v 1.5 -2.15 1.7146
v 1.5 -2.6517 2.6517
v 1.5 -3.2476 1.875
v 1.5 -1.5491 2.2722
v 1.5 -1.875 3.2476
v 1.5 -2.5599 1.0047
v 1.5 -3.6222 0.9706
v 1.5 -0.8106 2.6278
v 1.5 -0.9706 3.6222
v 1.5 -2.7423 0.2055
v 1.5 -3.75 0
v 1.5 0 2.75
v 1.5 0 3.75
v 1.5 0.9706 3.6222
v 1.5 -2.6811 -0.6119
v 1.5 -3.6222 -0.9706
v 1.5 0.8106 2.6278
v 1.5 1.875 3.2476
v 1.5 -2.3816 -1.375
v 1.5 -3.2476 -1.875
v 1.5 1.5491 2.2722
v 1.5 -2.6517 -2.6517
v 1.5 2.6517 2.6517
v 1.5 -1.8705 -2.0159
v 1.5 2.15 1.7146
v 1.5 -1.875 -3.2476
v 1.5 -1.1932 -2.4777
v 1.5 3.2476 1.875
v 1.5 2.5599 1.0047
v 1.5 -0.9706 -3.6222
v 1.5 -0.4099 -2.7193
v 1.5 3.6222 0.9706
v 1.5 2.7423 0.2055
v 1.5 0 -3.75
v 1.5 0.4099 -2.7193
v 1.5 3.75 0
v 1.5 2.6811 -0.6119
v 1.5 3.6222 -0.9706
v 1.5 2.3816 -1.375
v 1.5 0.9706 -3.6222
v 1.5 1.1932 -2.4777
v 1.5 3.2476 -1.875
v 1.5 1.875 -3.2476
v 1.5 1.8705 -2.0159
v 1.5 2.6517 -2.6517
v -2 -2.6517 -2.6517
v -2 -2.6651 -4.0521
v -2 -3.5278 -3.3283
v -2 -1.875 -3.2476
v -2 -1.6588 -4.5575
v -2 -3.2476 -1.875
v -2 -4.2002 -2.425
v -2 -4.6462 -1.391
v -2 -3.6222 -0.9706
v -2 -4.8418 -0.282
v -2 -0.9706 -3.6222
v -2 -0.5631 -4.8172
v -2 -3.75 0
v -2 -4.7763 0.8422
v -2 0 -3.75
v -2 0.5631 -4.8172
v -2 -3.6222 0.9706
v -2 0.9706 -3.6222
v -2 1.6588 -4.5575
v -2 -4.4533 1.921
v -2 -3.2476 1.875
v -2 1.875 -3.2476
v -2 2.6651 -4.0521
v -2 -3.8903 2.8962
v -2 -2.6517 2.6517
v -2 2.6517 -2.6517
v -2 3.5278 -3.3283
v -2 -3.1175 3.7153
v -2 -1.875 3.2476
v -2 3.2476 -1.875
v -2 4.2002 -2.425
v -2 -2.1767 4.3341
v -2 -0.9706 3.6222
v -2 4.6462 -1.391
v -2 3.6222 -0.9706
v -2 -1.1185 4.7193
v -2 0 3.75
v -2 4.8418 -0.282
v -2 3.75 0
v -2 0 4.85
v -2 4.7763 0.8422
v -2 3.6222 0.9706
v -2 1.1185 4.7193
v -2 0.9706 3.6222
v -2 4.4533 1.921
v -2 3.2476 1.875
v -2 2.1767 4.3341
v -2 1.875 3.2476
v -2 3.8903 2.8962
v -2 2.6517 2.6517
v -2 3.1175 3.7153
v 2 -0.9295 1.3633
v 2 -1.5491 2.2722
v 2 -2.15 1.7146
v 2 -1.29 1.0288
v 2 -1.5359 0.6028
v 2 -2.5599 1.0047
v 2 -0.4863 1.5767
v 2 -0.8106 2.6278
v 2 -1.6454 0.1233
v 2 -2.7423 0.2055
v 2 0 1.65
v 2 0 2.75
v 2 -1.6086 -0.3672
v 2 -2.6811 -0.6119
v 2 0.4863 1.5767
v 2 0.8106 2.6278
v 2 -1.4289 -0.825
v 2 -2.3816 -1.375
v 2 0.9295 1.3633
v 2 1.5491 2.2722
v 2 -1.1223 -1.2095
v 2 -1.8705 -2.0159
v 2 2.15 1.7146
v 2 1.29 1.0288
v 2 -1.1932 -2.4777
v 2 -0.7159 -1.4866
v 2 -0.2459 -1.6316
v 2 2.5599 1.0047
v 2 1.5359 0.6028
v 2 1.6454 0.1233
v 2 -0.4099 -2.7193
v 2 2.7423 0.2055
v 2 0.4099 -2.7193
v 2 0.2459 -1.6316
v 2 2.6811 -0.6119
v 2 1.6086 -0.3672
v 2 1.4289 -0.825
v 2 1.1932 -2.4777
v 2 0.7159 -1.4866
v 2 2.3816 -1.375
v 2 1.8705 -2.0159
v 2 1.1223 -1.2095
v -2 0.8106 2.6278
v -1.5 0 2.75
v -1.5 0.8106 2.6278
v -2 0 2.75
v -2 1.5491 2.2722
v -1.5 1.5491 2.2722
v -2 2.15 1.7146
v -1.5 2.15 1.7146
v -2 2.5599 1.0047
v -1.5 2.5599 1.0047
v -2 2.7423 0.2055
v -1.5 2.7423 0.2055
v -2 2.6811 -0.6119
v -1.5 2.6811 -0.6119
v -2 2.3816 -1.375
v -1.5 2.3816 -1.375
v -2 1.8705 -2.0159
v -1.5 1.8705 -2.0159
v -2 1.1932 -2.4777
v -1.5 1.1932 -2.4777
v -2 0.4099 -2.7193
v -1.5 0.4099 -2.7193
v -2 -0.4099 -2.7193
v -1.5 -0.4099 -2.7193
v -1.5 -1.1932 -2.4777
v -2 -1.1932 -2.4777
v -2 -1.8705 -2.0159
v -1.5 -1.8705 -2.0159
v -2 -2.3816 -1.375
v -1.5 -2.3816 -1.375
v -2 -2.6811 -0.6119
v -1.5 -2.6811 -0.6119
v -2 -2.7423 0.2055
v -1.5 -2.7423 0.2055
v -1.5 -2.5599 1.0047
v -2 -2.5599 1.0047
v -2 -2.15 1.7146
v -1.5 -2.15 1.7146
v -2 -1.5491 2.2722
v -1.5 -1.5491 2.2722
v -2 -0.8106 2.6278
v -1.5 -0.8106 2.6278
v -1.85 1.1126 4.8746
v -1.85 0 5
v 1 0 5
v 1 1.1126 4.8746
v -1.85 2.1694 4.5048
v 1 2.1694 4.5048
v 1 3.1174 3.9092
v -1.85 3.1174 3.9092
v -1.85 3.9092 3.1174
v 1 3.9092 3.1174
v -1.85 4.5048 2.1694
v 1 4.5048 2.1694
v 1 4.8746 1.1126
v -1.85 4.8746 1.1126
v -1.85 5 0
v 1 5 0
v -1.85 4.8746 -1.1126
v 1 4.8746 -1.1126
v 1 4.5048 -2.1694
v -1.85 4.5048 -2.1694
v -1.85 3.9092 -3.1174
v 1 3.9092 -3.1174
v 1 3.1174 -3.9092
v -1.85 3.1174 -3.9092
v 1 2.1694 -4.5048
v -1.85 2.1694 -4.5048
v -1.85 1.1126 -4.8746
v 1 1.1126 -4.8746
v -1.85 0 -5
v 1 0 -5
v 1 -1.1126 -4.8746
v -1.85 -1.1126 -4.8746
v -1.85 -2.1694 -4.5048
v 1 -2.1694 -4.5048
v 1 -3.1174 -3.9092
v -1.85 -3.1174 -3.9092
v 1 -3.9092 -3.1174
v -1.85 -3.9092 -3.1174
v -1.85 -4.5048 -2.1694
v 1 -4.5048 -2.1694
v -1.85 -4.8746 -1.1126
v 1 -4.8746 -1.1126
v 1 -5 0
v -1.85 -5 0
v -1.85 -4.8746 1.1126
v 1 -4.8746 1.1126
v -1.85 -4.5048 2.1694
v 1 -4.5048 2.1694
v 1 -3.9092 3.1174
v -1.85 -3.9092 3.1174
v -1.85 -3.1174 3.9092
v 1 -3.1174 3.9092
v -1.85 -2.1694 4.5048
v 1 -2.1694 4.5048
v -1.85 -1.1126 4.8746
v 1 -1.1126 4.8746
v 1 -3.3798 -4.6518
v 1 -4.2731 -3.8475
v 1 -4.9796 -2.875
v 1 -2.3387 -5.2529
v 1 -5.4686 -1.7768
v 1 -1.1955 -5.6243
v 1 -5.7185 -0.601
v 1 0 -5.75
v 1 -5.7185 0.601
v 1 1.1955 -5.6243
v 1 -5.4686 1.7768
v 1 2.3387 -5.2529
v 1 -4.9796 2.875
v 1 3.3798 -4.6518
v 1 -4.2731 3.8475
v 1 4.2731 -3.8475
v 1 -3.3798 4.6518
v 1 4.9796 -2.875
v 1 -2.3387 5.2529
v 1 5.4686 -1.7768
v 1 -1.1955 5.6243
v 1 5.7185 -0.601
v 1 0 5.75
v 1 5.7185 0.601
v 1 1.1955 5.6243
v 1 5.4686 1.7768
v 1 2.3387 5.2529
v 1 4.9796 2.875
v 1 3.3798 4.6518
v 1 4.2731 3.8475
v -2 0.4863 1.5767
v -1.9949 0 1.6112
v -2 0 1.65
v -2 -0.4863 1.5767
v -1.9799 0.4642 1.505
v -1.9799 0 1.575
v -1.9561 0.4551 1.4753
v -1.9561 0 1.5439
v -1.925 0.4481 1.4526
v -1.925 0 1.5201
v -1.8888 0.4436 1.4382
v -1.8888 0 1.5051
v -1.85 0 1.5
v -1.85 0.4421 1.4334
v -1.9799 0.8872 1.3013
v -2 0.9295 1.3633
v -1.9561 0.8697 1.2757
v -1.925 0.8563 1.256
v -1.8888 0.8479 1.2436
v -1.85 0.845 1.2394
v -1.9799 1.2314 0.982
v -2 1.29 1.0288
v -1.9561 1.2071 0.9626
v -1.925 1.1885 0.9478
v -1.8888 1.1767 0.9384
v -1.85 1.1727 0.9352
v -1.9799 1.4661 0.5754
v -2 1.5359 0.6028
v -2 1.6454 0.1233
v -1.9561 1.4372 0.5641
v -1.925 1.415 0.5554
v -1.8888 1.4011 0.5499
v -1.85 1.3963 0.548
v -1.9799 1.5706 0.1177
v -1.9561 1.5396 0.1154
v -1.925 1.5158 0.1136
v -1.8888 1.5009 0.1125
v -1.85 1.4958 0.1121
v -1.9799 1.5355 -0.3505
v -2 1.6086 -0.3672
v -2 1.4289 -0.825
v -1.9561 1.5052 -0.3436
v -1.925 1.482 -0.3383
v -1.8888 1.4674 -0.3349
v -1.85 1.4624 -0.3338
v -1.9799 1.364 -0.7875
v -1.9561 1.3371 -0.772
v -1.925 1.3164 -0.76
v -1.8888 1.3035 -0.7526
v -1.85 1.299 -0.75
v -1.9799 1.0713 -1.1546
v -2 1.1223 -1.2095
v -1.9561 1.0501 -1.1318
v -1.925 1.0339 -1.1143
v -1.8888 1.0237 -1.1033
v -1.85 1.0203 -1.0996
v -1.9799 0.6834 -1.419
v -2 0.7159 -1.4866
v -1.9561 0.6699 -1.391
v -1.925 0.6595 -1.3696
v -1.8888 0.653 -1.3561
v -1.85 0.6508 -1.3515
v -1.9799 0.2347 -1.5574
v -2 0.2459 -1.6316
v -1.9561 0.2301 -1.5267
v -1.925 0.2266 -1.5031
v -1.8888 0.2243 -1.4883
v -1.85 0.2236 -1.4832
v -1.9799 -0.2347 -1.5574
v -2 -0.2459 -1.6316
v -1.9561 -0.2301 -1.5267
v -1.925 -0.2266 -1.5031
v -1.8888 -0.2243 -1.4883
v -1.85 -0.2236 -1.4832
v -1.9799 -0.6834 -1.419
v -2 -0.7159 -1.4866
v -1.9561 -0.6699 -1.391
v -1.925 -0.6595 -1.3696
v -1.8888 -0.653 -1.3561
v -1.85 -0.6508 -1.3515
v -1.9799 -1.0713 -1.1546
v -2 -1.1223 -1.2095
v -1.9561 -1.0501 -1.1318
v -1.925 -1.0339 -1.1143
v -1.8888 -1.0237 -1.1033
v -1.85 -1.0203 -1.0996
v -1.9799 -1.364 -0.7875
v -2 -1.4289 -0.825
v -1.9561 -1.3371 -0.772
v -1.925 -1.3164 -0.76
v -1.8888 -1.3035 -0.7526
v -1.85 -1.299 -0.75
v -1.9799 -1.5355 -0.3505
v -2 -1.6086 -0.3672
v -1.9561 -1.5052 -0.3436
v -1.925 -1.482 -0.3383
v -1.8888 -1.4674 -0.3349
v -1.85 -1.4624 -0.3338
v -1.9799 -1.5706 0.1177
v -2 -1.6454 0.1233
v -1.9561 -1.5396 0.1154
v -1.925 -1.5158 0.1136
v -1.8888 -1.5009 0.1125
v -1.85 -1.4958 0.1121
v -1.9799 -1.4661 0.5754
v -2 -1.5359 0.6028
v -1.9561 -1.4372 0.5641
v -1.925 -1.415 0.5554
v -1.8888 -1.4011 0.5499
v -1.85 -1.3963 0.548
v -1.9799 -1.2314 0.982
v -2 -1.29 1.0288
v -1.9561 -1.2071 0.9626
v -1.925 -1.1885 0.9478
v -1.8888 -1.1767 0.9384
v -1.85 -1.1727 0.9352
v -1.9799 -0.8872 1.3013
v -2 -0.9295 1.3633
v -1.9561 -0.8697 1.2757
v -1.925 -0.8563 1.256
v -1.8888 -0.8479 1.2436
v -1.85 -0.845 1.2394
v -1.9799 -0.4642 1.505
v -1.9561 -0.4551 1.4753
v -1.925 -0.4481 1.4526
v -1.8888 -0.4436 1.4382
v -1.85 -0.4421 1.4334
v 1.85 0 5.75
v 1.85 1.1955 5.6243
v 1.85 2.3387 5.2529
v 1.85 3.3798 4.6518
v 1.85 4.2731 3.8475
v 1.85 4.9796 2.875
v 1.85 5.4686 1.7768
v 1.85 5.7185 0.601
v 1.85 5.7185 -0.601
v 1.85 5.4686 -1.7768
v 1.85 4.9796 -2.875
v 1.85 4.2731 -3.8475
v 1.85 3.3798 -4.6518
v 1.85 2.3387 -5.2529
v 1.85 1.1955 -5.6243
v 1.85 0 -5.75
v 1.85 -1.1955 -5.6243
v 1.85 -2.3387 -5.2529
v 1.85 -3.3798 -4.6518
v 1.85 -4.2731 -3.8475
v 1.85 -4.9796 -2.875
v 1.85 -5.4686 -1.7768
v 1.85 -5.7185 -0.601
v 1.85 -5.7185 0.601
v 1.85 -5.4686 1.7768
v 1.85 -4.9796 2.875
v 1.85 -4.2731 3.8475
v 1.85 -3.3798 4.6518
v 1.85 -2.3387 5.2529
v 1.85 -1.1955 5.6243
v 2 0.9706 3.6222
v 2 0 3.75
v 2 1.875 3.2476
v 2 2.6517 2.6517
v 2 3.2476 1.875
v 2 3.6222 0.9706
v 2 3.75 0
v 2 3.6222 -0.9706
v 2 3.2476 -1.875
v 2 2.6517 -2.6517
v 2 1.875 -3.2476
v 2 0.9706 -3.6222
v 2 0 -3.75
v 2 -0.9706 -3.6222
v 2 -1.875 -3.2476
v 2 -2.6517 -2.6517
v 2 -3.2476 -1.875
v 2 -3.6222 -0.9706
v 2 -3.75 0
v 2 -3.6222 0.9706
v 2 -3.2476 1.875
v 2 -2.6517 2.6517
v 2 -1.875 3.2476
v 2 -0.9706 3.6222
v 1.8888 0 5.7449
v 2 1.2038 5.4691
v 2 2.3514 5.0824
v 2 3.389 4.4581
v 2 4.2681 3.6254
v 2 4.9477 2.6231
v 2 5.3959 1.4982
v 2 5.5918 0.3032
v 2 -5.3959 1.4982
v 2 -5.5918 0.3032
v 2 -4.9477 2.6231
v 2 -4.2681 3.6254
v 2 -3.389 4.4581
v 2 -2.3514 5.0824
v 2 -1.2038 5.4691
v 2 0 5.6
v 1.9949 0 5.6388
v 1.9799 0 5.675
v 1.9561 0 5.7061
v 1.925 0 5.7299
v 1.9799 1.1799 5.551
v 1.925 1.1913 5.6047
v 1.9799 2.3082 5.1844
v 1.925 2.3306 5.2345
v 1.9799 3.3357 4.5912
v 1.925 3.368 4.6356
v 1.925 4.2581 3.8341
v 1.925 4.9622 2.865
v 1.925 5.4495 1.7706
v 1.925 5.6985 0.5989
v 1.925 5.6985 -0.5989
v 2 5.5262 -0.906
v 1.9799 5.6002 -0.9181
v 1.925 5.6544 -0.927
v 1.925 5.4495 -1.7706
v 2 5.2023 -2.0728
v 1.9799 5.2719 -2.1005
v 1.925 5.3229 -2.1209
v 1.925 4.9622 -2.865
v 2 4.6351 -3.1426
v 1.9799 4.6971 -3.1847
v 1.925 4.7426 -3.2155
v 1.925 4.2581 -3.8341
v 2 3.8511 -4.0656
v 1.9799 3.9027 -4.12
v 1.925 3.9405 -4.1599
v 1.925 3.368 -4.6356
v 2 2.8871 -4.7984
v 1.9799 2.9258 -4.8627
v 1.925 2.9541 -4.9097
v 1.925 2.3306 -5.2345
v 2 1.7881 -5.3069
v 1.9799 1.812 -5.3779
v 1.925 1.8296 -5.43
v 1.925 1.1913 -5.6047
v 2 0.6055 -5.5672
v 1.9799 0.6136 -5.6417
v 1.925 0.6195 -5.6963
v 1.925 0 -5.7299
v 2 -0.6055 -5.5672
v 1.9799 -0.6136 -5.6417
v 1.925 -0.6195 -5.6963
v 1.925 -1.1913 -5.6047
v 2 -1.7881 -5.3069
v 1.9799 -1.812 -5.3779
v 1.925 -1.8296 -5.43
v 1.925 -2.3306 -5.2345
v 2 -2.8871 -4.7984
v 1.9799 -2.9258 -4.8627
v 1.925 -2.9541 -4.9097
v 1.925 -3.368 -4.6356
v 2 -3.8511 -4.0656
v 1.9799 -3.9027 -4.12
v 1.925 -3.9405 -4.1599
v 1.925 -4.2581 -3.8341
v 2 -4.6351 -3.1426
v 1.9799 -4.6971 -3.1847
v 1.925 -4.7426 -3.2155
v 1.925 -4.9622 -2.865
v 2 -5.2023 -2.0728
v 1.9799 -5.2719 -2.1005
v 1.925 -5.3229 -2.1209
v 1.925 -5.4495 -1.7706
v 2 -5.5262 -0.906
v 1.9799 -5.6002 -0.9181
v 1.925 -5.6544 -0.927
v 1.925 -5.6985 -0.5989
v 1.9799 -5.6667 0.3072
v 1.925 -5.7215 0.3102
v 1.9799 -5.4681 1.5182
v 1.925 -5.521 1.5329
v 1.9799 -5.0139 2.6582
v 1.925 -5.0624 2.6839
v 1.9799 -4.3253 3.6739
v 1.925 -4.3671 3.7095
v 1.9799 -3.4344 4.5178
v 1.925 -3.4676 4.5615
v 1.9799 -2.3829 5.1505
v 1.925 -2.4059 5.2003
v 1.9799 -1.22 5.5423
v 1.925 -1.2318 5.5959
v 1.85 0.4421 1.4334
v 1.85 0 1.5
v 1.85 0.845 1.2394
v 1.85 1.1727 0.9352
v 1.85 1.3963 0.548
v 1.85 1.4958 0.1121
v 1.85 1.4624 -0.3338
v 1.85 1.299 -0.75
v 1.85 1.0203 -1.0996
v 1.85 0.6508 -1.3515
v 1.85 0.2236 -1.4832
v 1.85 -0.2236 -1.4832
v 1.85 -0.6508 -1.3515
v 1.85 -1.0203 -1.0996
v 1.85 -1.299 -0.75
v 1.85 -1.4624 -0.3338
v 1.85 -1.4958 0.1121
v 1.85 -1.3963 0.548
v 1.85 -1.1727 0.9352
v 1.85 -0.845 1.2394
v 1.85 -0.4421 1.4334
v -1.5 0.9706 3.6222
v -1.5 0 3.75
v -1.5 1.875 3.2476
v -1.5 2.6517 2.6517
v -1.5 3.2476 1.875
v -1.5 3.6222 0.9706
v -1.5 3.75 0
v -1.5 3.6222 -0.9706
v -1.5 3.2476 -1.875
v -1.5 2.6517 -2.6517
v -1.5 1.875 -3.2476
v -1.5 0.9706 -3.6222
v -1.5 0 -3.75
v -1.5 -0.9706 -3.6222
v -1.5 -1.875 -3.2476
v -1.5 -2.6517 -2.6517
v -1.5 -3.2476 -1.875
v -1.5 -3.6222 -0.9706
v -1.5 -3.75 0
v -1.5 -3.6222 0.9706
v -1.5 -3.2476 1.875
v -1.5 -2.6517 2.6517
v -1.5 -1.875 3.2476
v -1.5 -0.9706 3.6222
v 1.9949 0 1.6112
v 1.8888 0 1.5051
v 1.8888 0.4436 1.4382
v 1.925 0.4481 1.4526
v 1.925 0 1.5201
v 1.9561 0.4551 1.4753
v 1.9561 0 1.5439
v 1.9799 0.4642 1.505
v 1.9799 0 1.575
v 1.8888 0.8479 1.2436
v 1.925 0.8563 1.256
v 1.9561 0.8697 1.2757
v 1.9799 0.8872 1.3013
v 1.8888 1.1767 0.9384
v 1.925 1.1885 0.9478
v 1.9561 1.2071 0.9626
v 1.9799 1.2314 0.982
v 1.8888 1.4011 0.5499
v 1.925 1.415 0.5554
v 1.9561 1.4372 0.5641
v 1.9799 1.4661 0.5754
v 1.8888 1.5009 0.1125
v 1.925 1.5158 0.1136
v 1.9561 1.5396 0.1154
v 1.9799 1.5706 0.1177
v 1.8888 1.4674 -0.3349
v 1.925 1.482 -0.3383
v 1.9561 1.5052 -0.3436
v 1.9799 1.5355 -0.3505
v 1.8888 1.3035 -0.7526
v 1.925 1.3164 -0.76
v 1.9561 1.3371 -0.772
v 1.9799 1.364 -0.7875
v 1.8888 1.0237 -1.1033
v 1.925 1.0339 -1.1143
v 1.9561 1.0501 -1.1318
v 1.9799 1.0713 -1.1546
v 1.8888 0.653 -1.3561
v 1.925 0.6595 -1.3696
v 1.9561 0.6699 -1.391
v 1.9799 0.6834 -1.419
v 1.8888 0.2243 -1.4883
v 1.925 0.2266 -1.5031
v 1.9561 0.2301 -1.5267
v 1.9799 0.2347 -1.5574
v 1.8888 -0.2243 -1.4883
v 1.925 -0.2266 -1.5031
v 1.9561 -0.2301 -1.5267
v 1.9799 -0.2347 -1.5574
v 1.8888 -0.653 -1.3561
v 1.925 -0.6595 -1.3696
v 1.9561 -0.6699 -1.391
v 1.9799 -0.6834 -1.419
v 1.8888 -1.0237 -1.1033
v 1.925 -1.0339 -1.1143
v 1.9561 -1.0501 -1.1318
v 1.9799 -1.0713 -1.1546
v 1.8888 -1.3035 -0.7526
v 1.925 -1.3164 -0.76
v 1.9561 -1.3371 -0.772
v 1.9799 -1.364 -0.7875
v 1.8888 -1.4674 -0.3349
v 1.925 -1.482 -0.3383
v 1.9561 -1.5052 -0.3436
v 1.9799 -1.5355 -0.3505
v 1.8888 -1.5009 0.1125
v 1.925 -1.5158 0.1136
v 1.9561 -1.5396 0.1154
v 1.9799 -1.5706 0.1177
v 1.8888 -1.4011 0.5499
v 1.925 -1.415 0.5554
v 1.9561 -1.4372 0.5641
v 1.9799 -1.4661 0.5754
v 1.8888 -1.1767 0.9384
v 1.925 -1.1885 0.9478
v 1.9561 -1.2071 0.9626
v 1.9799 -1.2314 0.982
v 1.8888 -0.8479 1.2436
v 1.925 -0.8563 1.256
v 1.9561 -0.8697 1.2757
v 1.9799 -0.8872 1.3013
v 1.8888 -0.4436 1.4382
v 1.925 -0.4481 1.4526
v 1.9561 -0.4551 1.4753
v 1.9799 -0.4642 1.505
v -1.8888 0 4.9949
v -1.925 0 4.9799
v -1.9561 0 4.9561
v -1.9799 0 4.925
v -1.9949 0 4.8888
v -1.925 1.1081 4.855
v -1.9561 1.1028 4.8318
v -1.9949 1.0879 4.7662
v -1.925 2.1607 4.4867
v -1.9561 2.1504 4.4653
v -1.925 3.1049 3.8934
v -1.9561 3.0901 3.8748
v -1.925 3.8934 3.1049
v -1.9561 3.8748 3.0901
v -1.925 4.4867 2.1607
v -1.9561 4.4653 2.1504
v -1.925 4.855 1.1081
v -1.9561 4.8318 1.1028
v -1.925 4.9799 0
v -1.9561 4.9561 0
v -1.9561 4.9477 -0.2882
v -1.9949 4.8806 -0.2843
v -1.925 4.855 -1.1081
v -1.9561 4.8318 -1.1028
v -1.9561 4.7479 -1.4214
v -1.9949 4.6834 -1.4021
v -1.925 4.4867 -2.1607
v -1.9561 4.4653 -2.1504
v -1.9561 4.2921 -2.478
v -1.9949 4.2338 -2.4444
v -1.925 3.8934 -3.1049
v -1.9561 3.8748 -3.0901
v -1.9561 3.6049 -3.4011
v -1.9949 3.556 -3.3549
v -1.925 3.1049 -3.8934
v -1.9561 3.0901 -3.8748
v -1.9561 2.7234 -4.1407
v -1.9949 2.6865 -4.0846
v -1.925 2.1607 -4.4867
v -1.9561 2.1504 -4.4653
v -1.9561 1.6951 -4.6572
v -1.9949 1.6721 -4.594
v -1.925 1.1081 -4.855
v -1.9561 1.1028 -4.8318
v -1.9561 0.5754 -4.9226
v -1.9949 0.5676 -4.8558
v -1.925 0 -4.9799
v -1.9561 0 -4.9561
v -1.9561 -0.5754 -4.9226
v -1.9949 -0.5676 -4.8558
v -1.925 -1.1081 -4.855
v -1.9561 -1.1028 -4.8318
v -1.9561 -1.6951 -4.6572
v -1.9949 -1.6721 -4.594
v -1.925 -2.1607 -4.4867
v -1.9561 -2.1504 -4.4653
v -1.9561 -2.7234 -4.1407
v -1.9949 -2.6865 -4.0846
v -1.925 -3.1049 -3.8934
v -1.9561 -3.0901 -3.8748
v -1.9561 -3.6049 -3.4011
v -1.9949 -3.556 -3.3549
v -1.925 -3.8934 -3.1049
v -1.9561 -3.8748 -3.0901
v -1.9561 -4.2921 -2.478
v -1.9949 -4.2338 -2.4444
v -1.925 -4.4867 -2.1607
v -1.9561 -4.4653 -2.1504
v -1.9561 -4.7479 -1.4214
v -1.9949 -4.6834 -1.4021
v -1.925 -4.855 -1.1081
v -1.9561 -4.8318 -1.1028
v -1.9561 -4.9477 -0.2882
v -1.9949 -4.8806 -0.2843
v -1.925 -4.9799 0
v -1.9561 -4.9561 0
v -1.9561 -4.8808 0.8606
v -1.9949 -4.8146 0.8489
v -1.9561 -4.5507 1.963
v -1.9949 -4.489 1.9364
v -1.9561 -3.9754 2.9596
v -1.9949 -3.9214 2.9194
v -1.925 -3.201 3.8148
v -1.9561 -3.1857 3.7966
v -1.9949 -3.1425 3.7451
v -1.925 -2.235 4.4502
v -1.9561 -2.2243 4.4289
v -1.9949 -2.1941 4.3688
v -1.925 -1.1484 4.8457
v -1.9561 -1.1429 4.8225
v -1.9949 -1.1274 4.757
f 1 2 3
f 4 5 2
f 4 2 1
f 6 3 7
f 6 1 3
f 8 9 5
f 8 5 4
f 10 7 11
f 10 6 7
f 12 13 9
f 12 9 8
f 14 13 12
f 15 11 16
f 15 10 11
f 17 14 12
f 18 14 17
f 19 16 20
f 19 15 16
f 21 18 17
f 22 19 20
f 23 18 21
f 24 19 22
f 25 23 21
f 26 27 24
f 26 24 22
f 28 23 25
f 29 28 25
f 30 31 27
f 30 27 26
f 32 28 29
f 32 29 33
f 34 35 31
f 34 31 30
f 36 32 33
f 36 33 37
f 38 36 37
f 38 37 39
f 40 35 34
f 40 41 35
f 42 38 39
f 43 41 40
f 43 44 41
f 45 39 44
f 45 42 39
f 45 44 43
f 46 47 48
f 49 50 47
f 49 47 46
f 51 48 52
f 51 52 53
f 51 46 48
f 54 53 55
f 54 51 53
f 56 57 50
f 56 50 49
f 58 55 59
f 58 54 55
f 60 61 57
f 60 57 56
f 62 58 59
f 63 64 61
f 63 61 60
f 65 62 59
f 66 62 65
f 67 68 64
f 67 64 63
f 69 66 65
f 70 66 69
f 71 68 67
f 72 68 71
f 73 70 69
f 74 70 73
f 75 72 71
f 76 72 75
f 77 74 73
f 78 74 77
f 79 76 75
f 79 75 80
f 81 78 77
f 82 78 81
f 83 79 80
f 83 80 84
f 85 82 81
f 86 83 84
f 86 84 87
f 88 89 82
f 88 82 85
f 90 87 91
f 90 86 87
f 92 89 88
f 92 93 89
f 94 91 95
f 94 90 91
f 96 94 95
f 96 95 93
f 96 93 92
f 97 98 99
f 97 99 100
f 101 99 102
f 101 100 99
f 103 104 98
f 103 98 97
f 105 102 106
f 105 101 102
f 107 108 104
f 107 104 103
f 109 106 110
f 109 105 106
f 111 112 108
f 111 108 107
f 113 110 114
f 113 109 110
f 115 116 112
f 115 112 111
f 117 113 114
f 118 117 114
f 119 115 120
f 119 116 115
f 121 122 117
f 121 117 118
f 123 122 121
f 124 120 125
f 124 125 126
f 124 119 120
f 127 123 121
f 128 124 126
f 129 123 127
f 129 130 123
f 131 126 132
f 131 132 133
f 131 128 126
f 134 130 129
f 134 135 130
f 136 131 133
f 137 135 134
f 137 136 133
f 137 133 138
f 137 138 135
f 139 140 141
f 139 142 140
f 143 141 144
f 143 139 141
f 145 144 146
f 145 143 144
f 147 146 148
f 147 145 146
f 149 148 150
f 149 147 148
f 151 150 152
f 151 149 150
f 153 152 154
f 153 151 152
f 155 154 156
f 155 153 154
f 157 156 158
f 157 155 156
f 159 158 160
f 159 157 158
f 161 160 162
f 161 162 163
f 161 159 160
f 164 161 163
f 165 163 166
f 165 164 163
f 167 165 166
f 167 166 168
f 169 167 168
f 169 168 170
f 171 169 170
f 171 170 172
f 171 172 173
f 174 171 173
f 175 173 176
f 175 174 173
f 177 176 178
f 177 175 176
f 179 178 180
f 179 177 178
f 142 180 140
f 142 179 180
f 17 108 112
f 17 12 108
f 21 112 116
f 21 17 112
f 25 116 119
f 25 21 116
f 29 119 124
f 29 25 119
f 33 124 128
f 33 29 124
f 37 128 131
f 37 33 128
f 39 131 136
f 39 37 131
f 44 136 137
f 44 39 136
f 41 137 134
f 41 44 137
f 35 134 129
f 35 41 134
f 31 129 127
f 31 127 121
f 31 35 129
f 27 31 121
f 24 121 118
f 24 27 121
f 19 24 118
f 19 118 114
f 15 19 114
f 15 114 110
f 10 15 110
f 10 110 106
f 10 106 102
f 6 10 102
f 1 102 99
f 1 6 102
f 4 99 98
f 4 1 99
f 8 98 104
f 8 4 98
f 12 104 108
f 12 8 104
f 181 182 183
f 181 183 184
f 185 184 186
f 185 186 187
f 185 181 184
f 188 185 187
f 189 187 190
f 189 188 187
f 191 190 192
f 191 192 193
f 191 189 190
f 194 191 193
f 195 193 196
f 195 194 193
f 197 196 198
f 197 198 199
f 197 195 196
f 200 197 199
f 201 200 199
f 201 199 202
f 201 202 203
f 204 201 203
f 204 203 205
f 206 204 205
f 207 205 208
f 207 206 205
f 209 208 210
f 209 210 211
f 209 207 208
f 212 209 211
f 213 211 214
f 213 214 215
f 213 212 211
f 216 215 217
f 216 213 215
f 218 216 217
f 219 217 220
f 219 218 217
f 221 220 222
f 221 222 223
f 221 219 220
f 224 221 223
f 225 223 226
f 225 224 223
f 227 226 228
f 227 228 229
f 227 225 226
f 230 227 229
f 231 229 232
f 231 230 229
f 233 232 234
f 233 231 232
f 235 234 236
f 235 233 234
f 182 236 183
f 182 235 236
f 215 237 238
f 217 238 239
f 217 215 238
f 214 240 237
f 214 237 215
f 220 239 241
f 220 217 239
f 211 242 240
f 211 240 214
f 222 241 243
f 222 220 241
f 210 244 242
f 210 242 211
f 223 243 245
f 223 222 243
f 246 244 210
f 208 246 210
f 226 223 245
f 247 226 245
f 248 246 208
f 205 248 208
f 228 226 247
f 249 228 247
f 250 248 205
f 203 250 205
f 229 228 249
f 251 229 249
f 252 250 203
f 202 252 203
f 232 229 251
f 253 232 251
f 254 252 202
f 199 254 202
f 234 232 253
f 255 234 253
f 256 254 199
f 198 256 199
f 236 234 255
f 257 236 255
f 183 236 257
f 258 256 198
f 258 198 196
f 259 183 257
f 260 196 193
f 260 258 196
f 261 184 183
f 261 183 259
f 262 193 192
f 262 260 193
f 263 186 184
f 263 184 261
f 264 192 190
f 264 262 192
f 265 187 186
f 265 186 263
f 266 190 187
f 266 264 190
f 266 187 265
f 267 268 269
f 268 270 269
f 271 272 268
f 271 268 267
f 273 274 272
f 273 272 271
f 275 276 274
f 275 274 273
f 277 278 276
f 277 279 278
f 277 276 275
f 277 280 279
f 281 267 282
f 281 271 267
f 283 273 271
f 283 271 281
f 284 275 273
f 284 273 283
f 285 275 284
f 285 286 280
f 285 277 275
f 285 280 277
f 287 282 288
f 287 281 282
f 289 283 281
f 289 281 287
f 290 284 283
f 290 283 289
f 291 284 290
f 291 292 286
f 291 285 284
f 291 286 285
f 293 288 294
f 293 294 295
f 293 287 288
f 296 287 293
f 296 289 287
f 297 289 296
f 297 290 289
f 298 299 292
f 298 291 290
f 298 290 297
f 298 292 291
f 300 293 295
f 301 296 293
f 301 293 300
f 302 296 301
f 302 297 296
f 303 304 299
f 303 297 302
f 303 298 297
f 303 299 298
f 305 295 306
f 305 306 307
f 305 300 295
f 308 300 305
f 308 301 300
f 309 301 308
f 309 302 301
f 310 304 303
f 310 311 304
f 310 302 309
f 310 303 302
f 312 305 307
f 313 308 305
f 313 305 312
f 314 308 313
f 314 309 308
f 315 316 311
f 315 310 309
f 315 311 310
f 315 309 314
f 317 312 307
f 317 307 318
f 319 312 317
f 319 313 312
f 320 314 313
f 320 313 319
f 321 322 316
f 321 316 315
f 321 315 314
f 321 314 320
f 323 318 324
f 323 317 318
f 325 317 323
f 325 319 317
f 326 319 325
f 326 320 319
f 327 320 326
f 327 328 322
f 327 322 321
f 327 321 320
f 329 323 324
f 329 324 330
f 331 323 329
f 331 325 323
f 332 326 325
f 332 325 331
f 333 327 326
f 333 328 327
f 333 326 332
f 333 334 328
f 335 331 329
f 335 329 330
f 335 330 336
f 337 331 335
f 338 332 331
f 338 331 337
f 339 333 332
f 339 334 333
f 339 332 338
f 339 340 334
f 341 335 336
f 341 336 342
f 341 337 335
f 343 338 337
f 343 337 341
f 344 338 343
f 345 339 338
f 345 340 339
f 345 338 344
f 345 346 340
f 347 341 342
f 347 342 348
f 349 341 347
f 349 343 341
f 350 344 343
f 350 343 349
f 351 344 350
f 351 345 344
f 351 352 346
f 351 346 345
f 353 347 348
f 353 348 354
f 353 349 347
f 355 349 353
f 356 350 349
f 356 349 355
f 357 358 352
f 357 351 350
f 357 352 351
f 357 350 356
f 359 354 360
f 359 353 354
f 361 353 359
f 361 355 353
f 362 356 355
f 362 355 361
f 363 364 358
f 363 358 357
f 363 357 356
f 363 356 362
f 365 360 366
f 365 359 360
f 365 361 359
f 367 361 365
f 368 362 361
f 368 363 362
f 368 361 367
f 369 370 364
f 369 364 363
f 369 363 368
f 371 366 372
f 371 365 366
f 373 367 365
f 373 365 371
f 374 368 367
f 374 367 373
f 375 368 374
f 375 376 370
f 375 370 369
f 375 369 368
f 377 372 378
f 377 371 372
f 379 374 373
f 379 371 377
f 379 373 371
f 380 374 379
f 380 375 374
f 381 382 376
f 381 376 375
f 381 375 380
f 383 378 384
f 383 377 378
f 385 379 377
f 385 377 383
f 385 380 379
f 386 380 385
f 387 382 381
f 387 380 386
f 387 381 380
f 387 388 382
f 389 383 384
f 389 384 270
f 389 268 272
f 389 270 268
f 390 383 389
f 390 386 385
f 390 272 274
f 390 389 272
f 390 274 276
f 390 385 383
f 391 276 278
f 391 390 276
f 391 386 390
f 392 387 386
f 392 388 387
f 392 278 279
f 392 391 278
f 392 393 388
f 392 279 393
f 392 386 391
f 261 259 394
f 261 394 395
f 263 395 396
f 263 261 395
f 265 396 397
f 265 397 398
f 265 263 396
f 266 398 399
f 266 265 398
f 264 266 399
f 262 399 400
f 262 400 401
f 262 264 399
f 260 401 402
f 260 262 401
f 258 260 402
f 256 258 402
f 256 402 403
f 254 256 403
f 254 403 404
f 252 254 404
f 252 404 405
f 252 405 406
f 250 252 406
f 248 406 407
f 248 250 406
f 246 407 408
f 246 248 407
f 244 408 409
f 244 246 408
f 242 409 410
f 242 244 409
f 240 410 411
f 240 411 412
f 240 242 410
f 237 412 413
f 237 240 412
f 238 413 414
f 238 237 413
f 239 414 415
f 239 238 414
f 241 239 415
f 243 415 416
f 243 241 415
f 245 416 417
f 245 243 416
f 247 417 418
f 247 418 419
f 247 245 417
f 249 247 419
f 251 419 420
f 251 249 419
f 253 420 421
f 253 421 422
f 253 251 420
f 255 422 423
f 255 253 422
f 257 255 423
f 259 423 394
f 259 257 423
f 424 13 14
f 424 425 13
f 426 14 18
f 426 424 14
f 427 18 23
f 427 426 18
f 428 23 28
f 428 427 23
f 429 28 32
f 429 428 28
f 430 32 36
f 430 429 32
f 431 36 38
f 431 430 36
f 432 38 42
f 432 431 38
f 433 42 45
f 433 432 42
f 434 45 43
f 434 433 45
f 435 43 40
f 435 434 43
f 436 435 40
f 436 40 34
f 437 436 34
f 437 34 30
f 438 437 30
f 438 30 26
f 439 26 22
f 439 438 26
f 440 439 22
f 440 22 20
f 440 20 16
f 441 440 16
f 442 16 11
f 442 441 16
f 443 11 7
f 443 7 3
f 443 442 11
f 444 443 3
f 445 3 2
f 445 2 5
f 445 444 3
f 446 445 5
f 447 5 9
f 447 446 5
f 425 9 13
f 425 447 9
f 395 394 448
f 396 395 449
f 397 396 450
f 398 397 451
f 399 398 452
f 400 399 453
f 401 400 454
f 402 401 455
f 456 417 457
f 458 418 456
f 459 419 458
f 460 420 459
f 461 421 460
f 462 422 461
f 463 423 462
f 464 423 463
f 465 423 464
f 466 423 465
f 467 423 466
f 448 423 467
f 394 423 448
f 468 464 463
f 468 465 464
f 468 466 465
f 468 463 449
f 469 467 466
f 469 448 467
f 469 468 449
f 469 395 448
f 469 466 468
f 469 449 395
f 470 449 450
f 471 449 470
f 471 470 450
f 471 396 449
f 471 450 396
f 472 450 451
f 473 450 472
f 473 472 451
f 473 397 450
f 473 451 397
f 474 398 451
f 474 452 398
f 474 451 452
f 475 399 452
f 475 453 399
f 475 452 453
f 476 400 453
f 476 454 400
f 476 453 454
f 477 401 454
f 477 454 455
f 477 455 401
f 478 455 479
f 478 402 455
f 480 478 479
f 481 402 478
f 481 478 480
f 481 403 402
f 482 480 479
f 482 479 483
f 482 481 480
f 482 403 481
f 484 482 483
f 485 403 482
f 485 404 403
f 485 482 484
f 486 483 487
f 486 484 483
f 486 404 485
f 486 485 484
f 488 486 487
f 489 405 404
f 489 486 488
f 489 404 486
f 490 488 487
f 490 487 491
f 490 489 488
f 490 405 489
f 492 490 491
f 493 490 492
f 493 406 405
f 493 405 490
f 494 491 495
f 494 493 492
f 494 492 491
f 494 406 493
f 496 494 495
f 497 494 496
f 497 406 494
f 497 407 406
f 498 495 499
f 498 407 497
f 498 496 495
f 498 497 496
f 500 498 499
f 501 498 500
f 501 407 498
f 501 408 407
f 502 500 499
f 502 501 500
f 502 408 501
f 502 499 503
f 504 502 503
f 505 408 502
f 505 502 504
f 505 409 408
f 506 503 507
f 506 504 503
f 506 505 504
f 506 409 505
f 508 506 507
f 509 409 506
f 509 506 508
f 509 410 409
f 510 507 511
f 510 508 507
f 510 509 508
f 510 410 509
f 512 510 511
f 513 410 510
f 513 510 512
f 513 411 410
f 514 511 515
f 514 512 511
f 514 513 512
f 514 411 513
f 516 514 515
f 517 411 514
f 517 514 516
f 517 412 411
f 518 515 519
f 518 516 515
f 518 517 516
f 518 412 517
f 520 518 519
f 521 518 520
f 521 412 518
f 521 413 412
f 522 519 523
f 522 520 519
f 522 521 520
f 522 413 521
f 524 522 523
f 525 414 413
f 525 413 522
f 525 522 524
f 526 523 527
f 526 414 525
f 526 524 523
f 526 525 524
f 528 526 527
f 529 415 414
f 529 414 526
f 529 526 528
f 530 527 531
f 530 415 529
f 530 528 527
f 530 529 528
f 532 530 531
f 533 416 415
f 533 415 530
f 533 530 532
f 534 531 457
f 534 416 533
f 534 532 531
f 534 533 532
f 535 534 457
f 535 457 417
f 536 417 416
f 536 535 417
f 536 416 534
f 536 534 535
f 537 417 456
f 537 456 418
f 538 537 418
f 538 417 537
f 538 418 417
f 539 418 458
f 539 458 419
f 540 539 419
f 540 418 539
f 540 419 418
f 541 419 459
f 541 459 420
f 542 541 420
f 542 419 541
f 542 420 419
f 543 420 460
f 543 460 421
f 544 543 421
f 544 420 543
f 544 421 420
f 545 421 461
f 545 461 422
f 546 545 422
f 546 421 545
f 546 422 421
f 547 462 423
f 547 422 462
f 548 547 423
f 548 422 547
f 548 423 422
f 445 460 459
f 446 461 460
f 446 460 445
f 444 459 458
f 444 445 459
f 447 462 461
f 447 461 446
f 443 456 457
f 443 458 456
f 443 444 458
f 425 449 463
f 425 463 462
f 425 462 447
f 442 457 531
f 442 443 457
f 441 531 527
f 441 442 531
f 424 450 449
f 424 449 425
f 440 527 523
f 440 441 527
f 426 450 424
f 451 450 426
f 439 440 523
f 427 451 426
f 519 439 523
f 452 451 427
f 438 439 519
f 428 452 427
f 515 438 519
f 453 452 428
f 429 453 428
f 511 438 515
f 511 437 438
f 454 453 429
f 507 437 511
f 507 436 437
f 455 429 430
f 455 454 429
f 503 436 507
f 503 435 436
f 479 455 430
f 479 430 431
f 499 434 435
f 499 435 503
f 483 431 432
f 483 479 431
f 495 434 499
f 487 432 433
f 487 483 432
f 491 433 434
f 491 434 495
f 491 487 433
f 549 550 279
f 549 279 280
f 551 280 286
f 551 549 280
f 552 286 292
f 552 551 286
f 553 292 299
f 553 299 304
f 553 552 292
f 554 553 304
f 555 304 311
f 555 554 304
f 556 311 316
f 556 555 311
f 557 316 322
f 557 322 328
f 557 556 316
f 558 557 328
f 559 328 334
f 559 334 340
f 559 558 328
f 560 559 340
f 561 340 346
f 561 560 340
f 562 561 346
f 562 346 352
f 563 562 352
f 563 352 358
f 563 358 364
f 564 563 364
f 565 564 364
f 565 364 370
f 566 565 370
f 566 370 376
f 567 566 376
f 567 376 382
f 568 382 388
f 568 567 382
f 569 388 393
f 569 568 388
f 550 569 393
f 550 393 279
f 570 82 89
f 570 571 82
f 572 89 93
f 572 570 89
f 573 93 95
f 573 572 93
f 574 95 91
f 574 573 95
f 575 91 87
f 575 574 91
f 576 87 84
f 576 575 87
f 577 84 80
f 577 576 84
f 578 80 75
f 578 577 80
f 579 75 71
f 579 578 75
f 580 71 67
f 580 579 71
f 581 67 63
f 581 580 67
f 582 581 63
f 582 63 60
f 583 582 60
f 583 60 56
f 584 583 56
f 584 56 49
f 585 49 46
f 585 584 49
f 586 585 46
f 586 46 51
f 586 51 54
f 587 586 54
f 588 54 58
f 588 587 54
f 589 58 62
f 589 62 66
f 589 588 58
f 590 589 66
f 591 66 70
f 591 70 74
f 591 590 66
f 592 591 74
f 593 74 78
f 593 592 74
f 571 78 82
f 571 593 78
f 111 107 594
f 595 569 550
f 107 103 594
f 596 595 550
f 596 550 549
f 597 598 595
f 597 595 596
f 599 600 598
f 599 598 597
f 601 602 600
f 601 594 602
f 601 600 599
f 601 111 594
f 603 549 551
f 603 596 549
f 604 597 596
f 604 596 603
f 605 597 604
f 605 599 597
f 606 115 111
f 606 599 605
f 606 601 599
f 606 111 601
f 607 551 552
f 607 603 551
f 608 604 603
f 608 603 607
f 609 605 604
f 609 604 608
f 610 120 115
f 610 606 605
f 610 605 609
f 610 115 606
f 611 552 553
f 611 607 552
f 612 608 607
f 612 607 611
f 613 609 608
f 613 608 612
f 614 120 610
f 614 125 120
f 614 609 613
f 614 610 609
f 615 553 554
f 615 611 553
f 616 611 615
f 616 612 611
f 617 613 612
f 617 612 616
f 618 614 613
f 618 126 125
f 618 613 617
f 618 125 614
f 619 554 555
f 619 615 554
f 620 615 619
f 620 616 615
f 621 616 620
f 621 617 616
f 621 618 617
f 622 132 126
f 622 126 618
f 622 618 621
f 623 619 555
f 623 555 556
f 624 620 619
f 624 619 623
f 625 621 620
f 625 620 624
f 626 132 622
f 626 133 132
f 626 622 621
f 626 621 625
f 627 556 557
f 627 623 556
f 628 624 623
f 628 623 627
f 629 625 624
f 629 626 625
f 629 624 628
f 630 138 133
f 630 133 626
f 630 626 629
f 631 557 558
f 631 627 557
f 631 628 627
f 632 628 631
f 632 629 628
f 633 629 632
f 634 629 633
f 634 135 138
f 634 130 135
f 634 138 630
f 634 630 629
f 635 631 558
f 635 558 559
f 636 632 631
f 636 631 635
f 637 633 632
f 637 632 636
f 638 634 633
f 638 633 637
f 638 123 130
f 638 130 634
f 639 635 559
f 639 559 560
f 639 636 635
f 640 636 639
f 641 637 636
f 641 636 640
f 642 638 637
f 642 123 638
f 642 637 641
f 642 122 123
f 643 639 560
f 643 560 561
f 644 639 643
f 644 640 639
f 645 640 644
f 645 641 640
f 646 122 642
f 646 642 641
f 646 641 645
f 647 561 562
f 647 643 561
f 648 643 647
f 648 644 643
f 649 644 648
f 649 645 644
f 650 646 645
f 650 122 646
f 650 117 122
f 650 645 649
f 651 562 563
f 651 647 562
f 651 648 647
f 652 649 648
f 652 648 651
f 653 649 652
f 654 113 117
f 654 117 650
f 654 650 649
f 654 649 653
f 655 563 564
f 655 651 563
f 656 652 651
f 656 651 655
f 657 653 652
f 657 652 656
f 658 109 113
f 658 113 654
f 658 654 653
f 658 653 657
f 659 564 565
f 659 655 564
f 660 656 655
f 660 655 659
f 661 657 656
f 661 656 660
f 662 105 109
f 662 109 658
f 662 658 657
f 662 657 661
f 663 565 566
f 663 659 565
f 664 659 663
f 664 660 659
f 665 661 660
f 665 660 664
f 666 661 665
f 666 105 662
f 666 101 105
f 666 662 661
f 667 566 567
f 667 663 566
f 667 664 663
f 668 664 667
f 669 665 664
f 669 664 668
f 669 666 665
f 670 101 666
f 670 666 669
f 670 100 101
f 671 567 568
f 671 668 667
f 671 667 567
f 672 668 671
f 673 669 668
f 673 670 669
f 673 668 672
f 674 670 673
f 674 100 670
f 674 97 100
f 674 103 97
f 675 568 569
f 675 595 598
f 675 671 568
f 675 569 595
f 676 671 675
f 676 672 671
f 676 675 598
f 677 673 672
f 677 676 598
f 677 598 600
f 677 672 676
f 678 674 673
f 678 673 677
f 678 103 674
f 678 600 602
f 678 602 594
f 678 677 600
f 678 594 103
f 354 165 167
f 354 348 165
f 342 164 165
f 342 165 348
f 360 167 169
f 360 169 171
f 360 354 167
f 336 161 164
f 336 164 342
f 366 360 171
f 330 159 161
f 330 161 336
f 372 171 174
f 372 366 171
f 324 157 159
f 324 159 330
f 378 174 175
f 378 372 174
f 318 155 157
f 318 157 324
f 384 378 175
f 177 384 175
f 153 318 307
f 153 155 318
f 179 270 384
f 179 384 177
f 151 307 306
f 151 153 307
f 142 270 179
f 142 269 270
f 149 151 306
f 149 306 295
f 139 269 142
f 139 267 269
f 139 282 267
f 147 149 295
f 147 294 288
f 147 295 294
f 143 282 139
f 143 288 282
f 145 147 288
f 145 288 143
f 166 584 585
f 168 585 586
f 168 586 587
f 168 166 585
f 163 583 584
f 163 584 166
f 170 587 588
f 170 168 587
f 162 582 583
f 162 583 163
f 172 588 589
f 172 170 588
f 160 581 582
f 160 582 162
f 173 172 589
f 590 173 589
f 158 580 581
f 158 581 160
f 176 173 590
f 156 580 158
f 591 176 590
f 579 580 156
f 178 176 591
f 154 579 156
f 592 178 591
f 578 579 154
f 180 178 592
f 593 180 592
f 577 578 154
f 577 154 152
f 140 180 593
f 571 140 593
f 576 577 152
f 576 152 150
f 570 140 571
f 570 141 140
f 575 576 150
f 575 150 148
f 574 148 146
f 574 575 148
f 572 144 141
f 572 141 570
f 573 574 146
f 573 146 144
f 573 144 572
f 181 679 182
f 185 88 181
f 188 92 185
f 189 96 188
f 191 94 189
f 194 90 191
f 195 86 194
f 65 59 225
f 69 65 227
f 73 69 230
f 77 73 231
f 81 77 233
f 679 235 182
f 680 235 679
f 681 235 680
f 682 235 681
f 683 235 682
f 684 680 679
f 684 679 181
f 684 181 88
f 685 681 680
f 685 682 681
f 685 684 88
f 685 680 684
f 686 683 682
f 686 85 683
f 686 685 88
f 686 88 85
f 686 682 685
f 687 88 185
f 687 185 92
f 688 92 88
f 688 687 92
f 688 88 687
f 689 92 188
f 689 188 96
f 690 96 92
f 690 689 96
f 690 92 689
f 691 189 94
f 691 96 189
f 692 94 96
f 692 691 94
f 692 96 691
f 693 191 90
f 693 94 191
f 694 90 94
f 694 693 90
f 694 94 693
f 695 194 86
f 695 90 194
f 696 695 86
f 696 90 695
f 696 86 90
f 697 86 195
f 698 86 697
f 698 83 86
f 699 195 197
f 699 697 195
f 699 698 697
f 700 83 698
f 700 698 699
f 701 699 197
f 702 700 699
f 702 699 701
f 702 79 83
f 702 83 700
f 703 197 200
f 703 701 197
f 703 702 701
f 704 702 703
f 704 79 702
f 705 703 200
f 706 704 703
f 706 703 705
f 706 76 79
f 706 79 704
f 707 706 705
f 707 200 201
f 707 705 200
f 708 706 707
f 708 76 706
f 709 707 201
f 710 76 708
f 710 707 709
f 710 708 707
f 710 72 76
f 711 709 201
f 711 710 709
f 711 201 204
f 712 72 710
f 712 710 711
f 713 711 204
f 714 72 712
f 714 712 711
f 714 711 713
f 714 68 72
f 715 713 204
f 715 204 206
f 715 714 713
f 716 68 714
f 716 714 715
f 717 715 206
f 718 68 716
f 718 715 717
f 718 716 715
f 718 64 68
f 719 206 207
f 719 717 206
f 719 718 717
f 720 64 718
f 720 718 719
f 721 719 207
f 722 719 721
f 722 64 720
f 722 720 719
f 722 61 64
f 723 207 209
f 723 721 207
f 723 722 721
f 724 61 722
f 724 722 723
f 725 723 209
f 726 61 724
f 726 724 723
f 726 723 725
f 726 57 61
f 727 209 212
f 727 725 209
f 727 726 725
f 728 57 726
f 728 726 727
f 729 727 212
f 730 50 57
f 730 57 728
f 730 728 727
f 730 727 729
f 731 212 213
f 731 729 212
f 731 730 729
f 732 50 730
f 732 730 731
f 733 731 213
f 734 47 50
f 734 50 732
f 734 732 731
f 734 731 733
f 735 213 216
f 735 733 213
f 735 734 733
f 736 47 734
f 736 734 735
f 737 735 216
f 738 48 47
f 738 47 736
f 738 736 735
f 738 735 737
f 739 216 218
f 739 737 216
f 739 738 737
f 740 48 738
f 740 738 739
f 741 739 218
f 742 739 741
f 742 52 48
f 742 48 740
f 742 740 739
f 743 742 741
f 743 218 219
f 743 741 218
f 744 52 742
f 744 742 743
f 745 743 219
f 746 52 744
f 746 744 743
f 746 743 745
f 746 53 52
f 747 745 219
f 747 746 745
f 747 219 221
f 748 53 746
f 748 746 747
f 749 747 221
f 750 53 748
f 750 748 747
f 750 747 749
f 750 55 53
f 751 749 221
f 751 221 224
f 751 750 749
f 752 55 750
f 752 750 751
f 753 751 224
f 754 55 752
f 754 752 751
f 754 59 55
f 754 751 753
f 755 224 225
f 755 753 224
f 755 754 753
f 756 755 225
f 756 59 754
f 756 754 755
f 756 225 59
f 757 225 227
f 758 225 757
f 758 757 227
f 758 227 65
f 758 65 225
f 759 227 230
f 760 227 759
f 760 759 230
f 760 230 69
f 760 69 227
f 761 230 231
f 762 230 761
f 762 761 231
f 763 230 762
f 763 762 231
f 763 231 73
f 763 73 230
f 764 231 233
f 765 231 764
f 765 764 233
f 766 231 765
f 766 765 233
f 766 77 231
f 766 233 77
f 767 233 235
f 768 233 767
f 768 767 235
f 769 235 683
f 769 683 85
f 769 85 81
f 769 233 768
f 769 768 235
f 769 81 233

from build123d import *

# Parameters (mm, degrees)
F2_R = 0.15


with BuildPart() as f1:
    # F0 (on Front) → F1 (revolve)
    with BuildSketch(Plane.XZ):
        Polygon((-2, 2.75), (-2, 1.5), (2, 1.5), (2, 2.75), (1.5, 2.75), (1.5, 3.75), (2, 3.75), (2, 5.75), (1, 5.75), (1, 5), (-2, 5), (-2, 3.75), (-1.5, 3.75), (-1.5, 2.75), align=None)
    revolve(axis=Axis((-2.919078, 0, 0), (-1, 0, 0)))

    # F2
    f2_edges = [f1.edges().sort_by_distance(p)[0] for p in [
        (-2, 0, -5),
        (2, 0, -5.75),
        (-2, 0, -1.5),
        (2, 0, -1.5),
    ]]
    fillet(f2_edges, radius=F2_R)


solid = f1.part
